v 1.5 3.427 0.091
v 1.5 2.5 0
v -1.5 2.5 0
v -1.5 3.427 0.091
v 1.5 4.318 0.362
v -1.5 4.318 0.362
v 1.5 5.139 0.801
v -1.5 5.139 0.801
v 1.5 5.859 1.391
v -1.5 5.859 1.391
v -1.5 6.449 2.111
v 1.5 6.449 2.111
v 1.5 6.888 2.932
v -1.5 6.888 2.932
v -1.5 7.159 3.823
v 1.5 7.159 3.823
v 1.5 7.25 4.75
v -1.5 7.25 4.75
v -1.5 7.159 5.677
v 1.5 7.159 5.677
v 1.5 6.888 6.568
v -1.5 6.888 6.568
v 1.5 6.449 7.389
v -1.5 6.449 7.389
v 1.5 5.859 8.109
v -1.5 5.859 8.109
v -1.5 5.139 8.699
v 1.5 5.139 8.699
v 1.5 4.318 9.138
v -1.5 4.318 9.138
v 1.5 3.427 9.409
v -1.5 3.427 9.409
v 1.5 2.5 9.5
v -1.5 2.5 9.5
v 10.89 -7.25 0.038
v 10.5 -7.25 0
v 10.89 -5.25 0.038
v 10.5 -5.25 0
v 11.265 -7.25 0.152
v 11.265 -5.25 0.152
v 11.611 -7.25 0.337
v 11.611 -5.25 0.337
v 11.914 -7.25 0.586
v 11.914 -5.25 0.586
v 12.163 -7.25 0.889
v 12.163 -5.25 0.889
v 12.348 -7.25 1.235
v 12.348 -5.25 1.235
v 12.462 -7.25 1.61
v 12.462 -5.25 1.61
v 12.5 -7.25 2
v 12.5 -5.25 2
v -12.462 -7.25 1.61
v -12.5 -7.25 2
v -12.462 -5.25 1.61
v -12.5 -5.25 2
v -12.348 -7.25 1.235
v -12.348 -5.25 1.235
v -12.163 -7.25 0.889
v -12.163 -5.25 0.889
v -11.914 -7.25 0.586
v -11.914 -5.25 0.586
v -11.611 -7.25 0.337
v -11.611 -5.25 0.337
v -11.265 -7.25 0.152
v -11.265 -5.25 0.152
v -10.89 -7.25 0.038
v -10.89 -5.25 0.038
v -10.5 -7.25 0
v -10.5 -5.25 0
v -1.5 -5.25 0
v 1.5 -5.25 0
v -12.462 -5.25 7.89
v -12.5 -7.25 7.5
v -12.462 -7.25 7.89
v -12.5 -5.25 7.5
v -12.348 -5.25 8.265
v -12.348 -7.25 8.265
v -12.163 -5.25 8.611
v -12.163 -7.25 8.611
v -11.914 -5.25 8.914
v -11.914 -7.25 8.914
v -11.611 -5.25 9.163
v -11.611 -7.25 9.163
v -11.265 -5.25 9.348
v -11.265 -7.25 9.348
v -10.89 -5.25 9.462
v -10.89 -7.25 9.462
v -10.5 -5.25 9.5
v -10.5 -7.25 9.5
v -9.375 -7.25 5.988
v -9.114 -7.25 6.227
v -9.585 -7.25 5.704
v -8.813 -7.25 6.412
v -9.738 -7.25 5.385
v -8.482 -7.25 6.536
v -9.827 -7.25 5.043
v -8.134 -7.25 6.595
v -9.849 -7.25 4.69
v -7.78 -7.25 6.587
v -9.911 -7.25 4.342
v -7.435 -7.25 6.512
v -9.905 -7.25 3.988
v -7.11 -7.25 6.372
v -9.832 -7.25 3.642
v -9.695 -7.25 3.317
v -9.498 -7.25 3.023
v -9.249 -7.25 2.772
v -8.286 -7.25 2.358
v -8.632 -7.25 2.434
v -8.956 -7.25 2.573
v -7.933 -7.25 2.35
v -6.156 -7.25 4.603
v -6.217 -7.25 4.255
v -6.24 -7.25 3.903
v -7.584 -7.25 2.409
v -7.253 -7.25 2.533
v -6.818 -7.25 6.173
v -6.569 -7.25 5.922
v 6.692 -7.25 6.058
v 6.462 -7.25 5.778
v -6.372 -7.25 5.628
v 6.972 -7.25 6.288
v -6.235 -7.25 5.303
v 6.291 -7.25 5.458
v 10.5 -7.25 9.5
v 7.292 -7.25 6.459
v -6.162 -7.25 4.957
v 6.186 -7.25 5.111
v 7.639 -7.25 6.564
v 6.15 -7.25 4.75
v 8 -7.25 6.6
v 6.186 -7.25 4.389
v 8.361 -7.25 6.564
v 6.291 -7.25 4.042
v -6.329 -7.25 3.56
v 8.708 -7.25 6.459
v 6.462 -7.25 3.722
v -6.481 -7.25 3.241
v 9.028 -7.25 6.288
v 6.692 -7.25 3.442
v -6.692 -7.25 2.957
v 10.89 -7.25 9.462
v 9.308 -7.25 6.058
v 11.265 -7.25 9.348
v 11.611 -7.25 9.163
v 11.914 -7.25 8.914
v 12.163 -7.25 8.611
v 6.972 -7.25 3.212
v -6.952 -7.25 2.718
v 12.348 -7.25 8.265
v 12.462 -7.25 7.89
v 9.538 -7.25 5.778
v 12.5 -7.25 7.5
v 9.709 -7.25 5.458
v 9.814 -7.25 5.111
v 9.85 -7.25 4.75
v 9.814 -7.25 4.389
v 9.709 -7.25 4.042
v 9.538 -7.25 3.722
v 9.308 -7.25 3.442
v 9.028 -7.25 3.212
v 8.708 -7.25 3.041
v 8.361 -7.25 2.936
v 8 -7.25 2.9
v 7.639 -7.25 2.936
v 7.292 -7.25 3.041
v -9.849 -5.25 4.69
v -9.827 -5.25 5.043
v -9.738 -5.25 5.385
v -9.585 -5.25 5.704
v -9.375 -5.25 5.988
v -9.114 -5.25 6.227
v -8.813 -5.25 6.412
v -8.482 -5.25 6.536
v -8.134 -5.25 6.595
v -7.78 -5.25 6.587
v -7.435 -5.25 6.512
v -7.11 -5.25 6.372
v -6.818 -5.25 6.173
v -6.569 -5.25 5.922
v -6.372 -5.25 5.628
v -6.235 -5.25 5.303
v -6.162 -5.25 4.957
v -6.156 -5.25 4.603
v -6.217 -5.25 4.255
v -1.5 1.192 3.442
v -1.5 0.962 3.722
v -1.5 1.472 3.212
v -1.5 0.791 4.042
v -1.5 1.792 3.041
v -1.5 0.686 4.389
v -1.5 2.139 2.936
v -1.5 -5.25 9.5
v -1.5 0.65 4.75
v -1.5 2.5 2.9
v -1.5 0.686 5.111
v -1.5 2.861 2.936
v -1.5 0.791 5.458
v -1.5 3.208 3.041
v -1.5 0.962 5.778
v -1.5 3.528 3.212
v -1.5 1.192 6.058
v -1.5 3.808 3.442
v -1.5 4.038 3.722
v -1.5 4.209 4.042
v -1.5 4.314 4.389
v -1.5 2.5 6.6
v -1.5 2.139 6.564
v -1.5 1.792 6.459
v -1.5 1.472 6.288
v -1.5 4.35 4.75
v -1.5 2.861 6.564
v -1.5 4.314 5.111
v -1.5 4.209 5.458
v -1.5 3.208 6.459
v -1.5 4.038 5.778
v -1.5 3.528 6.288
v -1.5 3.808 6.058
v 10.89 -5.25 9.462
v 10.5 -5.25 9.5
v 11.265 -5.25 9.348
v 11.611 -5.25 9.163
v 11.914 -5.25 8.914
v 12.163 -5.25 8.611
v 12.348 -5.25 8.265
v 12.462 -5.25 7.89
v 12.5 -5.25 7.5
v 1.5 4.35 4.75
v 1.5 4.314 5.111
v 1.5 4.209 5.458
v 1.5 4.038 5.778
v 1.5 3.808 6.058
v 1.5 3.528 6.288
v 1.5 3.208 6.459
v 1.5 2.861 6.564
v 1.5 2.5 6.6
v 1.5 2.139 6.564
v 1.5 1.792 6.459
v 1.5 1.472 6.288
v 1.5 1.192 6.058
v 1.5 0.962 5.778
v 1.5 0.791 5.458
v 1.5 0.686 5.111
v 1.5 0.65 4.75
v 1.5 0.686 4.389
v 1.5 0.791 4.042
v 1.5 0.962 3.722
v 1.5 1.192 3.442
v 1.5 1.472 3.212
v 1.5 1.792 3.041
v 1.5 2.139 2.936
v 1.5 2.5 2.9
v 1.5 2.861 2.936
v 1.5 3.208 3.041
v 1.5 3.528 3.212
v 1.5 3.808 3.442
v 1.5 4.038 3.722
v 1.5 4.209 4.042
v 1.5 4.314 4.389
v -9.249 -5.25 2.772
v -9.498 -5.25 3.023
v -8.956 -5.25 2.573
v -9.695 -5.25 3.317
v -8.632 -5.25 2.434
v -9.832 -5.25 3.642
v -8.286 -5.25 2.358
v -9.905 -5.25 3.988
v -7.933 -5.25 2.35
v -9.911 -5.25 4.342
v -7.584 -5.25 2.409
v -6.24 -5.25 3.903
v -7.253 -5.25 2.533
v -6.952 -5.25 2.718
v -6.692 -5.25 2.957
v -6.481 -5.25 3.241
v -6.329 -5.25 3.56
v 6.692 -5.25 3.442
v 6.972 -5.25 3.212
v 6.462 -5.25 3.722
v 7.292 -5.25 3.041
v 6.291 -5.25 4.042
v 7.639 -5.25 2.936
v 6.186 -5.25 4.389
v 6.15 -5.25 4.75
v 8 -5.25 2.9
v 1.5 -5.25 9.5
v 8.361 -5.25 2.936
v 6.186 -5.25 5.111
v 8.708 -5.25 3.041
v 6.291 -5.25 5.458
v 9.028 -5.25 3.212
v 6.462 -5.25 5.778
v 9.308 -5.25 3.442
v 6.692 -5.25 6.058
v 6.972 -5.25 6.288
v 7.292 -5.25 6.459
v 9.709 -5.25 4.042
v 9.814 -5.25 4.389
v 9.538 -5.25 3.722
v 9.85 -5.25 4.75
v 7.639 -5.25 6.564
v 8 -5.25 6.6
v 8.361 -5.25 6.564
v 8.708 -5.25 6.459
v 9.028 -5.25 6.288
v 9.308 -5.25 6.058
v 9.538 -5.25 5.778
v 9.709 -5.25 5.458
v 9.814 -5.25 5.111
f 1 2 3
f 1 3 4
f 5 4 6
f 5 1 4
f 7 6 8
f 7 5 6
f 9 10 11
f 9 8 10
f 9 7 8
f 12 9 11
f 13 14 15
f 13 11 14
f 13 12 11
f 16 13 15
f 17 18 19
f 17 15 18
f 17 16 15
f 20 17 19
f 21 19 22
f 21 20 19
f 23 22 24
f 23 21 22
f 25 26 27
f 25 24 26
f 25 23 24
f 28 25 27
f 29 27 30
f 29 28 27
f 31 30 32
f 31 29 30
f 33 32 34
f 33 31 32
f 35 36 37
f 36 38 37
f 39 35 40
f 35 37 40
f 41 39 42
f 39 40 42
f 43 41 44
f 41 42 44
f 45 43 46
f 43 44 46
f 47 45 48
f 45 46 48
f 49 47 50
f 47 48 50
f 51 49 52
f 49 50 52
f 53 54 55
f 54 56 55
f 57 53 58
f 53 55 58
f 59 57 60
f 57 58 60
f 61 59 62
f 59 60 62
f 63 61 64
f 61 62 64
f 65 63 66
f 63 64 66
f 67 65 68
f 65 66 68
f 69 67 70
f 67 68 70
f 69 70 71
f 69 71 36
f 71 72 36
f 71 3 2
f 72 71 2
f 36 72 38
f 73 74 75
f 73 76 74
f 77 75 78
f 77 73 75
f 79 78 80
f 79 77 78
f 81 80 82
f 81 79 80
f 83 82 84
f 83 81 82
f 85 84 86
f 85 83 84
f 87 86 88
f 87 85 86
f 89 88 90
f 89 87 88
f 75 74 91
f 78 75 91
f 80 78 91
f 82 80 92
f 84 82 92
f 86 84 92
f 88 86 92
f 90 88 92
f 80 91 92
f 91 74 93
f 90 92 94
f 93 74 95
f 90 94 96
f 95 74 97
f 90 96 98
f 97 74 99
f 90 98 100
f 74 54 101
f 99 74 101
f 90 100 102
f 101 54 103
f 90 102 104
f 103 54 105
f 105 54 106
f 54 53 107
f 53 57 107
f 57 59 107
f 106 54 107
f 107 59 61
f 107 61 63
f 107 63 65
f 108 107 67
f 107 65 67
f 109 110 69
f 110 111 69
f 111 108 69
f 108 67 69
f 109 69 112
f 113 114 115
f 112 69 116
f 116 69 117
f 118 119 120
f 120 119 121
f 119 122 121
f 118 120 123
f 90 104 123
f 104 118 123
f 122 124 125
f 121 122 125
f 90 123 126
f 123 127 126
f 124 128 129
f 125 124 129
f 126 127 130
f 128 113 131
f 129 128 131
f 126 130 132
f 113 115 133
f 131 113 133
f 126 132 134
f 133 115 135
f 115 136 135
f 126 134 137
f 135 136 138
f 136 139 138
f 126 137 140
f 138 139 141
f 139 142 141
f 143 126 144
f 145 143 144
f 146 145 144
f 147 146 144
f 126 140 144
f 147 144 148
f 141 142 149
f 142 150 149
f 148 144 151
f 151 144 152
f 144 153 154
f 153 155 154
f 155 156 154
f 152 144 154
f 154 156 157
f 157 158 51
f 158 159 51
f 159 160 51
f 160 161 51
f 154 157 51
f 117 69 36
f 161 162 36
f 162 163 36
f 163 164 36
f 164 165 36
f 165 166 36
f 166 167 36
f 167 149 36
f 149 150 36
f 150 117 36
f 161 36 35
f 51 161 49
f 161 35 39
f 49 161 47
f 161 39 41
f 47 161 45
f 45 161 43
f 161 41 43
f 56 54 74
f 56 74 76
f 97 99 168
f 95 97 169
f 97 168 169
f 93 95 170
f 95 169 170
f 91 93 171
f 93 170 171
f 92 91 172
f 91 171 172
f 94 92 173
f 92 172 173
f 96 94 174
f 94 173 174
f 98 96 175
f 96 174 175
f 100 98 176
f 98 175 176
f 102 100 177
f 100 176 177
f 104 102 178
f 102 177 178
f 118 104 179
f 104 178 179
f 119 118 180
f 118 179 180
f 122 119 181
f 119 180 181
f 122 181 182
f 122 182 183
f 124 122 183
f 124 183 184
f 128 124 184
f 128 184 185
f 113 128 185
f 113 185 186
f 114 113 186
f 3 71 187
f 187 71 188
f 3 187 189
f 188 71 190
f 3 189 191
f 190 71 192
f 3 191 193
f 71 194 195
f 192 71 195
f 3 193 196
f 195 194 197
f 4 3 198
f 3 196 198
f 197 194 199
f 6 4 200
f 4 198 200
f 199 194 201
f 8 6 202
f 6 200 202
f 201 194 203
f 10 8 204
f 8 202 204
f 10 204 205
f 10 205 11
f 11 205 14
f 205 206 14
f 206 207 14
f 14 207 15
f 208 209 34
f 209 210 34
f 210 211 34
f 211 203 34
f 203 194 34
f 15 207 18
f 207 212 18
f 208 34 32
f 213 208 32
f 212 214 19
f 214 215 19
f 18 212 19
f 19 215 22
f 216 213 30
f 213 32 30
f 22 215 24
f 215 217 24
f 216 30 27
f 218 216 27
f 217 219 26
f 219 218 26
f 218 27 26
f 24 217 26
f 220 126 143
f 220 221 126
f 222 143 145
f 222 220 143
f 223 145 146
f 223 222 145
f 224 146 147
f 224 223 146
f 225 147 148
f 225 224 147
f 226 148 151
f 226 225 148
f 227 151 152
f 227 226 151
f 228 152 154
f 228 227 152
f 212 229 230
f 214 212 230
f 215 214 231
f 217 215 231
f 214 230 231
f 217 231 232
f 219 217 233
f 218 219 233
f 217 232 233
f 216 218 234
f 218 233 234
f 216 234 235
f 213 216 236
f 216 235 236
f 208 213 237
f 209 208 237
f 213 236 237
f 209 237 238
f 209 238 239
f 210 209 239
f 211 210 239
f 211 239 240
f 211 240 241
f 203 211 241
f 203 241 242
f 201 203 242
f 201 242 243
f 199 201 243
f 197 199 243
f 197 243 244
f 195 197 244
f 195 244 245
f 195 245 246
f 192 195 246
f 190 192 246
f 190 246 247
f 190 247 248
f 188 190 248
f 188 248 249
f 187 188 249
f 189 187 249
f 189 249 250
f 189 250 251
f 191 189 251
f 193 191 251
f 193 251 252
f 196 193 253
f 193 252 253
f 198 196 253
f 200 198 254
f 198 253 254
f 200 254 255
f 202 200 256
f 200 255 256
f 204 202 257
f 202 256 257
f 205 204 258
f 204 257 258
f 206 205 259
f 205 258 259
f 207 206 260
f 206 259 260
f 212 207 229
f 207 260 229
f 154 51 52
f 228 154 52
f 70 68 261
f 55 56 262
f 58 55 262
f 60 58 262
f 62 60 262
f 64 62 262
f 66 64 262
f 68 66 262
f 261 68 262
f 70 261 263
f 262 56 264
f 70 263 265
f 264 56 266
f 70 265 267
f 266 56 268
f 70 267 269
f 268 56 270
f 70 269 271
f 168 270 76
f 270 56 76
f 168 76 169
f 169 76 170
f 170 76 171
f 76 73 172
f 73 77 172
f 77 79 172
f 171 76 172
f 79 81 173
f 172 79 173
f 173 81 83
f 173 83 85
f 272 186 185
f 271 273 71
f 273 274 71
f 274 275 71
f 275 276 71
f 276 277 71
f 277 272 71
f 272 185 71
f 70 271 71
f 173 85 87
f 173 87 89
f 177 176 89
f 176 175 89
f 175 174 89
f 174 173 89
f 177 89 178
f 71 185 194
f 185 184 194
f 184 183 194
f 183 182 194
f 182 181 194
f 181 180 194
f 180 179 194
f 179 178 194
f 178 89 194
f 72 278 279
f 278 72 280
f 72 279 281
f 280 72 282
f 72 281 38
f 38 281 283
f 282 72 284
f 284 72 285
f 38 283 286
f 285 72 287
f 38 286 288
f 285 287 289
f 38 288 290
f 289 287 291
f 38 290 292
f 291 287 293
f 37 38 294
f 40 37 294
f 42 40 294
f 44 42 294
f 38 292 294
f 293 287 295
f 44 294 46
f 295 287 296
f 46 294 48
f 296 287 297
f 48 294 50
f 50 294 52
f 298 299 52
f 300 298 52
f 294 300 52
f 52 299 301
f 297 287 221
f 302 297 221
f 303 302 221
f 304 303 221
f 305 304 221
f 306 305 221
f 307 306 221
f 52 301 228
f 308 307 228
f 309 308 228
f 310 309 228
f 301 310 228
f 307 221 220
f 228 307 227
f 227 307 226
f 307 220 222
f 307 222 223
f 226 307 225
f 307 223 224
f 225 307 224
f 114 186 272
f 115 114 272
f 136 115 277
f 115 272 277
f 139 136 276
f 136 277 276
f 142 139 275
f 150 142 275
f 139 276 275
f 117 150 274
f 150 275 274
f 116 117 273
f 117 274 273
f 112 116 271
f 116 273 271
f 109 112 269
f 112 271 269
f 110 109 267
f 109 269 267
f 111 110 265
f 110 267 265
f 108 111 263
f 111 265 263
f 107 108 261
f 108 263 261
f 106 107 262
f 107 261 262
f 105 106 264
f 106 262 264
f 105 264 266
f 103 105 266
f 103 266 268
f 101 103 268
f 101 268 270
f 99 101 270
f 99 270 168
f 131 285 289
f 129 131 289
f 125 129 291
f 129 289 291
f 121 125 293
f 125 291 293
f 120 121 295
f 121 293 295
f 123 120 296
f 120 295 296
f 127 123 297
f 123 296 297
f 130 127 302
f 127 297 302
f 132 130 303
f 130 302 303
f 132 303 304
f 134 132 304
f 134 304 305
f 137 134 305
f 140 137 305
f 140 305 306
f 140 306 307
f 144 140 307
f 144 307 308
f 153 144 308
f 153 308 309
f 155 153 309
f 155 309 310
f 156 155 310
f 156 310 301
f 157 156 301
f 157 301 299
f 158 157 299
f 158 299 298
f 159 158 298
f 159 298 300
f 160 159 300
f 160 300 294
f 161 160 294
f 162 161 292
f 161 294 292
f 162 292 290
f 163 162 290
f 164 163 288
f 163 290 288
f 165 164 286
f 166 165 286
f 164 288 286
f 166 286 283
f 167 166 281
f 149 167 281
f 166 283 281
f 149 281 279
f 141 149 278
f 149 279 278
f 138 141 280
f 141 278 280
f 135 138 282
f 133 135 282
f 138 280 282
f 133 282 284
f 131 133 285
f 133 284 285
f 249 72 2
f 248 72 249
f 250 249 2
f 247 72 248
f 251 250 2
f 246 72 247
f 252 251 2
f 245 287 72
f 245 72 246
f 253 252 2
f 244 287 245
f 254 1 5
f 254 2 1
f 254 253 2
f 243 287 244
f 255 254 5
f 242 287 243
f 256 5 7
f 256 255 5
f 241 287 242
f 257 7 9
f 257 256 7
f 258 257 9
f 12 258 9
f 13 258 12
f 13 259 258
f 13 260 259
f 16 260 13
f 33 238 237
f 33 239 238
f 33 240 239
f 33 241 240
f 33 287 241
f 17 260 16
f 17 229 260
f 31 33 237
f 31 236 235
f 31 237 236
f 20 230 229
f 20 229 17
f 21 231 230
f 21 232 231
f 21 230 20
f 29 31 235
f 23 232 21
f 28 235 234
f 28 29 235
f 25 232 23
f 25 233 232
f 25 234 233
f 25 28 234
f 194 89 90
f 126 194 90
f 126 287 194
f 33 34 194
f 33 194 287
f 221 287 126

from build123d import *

# Parameters (mm, degrees)
SKETCH1_W           = 25
SKETCH1_H           = 14.5
BOSS_EXTRUDE1_DEPTH = 9.5
CUT_EXTRUDE1_DEPTH  = 28.709429803
SKETCH3_W           = 11
SKETCH3_H           = 12.5
CUT_EXTRUDE2_DEPTH  = 18.293423606
SKETCH4_R           = 1.85
CUT_EXTRUDE3_DEPTH  = 19.406860134
FILLET1_R           = 2
SKETCH5_R           = 1.85
CUT_EXTRUDE4_DEPTH  = 21.06863224
SKETCH11_R          = 1.85
CUT_EXTRUDE10_DEPTH = 104.327776008


with BuildPart() as part:
    # Sketch1 → Boss-Extrude1 (new body)
    with BuildSketch(Plane.XY):
        Rectangle(SKETCH1_W, SKETCH1_H)
    extrude(amount=BOSS_EXTRUDE1_DEPTH)

    # Sketch2 → Cut-Extrude1 (cut, through all)
    with BuildSketch(Plane(origin=(12.5, 0, 0), x_dir=(0, 0, -1), z_dir=(1, 0, 0))):
        with BuildLine():
            Line((-9.5, 2.5), (-9.5, 8.25))
            Line((-9.5, 8.25), (0, 8.25))
            Line((0, 8.25), (0, 2.5))
            ThreePointArc((0, 2.5), (-4.75, 7.25), (-9.5, 2.5))
        make_face()
    extrude(amount=-CUT_EXTRUDE1_DEPTH, mode=Mode.SUBTRACT)

    # Sketch3 → Cut-Extrude2 (cut, through all)
    with BuildSketch(Plane.XY.offset(9.5)):
        with Locations((7, 1)):
            Rectangle(SKETCH3_W, SKETCH3_H)
        with Locations((-7, 1)):
            Rectangle(SKETCH3_W, SKETCH3_H)
    extrude(amount=-CUT_EXTRUDE2_DEPTH, mode=Mode.SUBTRACT)

    # Sketch4 → Cut-Extrude3 (cut, through all)
    with BuildSketch(Plane(origin=(1.5, 0, 0), x_dir=(0, 0, -1), z_dir=(1, 0, 0))):
        with Locations(Location((-4.75, 2.5, 0), (0, 0, 90))):
            Circle(SKETCH4_R)
    extrude(amount=-CUT_EXTRUDE3_DEPTH, mode=Mode.SUBTRACT)

    # Fillet1
    fillet1_edges = [part.edges().sort_by_distance(p)[0] for p in [
        (12.5, -6.25, 9.5),
        (12.5, -6.25, 0),
        (-12.5, -6.25, 9.5),
        (-12.5, -6.25, 0),
    ]]
    fillet(fillet1_edges, radius=FILLET1_R)

    # Sketch5 → Cut-Extrude4 (cut, through all)
    with BuildSketch(Plane(origin=(0, -5.25, 0), x_dir=(1, 0, 0), z_dir=(0, 1, 0))):
        with Locations(Location((-8, -4.75, 0), (0, 0, 180))):
            Circle(SKETCH5_R)
        with Locations(Location((8, -4.75, 0), (0, 0, 180))):
            Circle(SKETCH5_R)
    extrude(amount=-CUT_EXTRUDE4_DEPTH, mode=Mode.SUBTRACT)

    # Sketch11 → Cut-Extrude10 (cut, through all)
    with BuildSketch(Plane(origin=(-55.7, -5.25, -67.11030802), x_dir=(-1, 0, 0), z_dir=(0, 1, 0))):
        with Locations((-47.633605072, 71.30556155)):
            Circle(SKETCH11_R)
    extrude(amount=-CUT_EXTRUDE10_DEPTH, mode=Mode.SUBTRACT)


solid = part.part
